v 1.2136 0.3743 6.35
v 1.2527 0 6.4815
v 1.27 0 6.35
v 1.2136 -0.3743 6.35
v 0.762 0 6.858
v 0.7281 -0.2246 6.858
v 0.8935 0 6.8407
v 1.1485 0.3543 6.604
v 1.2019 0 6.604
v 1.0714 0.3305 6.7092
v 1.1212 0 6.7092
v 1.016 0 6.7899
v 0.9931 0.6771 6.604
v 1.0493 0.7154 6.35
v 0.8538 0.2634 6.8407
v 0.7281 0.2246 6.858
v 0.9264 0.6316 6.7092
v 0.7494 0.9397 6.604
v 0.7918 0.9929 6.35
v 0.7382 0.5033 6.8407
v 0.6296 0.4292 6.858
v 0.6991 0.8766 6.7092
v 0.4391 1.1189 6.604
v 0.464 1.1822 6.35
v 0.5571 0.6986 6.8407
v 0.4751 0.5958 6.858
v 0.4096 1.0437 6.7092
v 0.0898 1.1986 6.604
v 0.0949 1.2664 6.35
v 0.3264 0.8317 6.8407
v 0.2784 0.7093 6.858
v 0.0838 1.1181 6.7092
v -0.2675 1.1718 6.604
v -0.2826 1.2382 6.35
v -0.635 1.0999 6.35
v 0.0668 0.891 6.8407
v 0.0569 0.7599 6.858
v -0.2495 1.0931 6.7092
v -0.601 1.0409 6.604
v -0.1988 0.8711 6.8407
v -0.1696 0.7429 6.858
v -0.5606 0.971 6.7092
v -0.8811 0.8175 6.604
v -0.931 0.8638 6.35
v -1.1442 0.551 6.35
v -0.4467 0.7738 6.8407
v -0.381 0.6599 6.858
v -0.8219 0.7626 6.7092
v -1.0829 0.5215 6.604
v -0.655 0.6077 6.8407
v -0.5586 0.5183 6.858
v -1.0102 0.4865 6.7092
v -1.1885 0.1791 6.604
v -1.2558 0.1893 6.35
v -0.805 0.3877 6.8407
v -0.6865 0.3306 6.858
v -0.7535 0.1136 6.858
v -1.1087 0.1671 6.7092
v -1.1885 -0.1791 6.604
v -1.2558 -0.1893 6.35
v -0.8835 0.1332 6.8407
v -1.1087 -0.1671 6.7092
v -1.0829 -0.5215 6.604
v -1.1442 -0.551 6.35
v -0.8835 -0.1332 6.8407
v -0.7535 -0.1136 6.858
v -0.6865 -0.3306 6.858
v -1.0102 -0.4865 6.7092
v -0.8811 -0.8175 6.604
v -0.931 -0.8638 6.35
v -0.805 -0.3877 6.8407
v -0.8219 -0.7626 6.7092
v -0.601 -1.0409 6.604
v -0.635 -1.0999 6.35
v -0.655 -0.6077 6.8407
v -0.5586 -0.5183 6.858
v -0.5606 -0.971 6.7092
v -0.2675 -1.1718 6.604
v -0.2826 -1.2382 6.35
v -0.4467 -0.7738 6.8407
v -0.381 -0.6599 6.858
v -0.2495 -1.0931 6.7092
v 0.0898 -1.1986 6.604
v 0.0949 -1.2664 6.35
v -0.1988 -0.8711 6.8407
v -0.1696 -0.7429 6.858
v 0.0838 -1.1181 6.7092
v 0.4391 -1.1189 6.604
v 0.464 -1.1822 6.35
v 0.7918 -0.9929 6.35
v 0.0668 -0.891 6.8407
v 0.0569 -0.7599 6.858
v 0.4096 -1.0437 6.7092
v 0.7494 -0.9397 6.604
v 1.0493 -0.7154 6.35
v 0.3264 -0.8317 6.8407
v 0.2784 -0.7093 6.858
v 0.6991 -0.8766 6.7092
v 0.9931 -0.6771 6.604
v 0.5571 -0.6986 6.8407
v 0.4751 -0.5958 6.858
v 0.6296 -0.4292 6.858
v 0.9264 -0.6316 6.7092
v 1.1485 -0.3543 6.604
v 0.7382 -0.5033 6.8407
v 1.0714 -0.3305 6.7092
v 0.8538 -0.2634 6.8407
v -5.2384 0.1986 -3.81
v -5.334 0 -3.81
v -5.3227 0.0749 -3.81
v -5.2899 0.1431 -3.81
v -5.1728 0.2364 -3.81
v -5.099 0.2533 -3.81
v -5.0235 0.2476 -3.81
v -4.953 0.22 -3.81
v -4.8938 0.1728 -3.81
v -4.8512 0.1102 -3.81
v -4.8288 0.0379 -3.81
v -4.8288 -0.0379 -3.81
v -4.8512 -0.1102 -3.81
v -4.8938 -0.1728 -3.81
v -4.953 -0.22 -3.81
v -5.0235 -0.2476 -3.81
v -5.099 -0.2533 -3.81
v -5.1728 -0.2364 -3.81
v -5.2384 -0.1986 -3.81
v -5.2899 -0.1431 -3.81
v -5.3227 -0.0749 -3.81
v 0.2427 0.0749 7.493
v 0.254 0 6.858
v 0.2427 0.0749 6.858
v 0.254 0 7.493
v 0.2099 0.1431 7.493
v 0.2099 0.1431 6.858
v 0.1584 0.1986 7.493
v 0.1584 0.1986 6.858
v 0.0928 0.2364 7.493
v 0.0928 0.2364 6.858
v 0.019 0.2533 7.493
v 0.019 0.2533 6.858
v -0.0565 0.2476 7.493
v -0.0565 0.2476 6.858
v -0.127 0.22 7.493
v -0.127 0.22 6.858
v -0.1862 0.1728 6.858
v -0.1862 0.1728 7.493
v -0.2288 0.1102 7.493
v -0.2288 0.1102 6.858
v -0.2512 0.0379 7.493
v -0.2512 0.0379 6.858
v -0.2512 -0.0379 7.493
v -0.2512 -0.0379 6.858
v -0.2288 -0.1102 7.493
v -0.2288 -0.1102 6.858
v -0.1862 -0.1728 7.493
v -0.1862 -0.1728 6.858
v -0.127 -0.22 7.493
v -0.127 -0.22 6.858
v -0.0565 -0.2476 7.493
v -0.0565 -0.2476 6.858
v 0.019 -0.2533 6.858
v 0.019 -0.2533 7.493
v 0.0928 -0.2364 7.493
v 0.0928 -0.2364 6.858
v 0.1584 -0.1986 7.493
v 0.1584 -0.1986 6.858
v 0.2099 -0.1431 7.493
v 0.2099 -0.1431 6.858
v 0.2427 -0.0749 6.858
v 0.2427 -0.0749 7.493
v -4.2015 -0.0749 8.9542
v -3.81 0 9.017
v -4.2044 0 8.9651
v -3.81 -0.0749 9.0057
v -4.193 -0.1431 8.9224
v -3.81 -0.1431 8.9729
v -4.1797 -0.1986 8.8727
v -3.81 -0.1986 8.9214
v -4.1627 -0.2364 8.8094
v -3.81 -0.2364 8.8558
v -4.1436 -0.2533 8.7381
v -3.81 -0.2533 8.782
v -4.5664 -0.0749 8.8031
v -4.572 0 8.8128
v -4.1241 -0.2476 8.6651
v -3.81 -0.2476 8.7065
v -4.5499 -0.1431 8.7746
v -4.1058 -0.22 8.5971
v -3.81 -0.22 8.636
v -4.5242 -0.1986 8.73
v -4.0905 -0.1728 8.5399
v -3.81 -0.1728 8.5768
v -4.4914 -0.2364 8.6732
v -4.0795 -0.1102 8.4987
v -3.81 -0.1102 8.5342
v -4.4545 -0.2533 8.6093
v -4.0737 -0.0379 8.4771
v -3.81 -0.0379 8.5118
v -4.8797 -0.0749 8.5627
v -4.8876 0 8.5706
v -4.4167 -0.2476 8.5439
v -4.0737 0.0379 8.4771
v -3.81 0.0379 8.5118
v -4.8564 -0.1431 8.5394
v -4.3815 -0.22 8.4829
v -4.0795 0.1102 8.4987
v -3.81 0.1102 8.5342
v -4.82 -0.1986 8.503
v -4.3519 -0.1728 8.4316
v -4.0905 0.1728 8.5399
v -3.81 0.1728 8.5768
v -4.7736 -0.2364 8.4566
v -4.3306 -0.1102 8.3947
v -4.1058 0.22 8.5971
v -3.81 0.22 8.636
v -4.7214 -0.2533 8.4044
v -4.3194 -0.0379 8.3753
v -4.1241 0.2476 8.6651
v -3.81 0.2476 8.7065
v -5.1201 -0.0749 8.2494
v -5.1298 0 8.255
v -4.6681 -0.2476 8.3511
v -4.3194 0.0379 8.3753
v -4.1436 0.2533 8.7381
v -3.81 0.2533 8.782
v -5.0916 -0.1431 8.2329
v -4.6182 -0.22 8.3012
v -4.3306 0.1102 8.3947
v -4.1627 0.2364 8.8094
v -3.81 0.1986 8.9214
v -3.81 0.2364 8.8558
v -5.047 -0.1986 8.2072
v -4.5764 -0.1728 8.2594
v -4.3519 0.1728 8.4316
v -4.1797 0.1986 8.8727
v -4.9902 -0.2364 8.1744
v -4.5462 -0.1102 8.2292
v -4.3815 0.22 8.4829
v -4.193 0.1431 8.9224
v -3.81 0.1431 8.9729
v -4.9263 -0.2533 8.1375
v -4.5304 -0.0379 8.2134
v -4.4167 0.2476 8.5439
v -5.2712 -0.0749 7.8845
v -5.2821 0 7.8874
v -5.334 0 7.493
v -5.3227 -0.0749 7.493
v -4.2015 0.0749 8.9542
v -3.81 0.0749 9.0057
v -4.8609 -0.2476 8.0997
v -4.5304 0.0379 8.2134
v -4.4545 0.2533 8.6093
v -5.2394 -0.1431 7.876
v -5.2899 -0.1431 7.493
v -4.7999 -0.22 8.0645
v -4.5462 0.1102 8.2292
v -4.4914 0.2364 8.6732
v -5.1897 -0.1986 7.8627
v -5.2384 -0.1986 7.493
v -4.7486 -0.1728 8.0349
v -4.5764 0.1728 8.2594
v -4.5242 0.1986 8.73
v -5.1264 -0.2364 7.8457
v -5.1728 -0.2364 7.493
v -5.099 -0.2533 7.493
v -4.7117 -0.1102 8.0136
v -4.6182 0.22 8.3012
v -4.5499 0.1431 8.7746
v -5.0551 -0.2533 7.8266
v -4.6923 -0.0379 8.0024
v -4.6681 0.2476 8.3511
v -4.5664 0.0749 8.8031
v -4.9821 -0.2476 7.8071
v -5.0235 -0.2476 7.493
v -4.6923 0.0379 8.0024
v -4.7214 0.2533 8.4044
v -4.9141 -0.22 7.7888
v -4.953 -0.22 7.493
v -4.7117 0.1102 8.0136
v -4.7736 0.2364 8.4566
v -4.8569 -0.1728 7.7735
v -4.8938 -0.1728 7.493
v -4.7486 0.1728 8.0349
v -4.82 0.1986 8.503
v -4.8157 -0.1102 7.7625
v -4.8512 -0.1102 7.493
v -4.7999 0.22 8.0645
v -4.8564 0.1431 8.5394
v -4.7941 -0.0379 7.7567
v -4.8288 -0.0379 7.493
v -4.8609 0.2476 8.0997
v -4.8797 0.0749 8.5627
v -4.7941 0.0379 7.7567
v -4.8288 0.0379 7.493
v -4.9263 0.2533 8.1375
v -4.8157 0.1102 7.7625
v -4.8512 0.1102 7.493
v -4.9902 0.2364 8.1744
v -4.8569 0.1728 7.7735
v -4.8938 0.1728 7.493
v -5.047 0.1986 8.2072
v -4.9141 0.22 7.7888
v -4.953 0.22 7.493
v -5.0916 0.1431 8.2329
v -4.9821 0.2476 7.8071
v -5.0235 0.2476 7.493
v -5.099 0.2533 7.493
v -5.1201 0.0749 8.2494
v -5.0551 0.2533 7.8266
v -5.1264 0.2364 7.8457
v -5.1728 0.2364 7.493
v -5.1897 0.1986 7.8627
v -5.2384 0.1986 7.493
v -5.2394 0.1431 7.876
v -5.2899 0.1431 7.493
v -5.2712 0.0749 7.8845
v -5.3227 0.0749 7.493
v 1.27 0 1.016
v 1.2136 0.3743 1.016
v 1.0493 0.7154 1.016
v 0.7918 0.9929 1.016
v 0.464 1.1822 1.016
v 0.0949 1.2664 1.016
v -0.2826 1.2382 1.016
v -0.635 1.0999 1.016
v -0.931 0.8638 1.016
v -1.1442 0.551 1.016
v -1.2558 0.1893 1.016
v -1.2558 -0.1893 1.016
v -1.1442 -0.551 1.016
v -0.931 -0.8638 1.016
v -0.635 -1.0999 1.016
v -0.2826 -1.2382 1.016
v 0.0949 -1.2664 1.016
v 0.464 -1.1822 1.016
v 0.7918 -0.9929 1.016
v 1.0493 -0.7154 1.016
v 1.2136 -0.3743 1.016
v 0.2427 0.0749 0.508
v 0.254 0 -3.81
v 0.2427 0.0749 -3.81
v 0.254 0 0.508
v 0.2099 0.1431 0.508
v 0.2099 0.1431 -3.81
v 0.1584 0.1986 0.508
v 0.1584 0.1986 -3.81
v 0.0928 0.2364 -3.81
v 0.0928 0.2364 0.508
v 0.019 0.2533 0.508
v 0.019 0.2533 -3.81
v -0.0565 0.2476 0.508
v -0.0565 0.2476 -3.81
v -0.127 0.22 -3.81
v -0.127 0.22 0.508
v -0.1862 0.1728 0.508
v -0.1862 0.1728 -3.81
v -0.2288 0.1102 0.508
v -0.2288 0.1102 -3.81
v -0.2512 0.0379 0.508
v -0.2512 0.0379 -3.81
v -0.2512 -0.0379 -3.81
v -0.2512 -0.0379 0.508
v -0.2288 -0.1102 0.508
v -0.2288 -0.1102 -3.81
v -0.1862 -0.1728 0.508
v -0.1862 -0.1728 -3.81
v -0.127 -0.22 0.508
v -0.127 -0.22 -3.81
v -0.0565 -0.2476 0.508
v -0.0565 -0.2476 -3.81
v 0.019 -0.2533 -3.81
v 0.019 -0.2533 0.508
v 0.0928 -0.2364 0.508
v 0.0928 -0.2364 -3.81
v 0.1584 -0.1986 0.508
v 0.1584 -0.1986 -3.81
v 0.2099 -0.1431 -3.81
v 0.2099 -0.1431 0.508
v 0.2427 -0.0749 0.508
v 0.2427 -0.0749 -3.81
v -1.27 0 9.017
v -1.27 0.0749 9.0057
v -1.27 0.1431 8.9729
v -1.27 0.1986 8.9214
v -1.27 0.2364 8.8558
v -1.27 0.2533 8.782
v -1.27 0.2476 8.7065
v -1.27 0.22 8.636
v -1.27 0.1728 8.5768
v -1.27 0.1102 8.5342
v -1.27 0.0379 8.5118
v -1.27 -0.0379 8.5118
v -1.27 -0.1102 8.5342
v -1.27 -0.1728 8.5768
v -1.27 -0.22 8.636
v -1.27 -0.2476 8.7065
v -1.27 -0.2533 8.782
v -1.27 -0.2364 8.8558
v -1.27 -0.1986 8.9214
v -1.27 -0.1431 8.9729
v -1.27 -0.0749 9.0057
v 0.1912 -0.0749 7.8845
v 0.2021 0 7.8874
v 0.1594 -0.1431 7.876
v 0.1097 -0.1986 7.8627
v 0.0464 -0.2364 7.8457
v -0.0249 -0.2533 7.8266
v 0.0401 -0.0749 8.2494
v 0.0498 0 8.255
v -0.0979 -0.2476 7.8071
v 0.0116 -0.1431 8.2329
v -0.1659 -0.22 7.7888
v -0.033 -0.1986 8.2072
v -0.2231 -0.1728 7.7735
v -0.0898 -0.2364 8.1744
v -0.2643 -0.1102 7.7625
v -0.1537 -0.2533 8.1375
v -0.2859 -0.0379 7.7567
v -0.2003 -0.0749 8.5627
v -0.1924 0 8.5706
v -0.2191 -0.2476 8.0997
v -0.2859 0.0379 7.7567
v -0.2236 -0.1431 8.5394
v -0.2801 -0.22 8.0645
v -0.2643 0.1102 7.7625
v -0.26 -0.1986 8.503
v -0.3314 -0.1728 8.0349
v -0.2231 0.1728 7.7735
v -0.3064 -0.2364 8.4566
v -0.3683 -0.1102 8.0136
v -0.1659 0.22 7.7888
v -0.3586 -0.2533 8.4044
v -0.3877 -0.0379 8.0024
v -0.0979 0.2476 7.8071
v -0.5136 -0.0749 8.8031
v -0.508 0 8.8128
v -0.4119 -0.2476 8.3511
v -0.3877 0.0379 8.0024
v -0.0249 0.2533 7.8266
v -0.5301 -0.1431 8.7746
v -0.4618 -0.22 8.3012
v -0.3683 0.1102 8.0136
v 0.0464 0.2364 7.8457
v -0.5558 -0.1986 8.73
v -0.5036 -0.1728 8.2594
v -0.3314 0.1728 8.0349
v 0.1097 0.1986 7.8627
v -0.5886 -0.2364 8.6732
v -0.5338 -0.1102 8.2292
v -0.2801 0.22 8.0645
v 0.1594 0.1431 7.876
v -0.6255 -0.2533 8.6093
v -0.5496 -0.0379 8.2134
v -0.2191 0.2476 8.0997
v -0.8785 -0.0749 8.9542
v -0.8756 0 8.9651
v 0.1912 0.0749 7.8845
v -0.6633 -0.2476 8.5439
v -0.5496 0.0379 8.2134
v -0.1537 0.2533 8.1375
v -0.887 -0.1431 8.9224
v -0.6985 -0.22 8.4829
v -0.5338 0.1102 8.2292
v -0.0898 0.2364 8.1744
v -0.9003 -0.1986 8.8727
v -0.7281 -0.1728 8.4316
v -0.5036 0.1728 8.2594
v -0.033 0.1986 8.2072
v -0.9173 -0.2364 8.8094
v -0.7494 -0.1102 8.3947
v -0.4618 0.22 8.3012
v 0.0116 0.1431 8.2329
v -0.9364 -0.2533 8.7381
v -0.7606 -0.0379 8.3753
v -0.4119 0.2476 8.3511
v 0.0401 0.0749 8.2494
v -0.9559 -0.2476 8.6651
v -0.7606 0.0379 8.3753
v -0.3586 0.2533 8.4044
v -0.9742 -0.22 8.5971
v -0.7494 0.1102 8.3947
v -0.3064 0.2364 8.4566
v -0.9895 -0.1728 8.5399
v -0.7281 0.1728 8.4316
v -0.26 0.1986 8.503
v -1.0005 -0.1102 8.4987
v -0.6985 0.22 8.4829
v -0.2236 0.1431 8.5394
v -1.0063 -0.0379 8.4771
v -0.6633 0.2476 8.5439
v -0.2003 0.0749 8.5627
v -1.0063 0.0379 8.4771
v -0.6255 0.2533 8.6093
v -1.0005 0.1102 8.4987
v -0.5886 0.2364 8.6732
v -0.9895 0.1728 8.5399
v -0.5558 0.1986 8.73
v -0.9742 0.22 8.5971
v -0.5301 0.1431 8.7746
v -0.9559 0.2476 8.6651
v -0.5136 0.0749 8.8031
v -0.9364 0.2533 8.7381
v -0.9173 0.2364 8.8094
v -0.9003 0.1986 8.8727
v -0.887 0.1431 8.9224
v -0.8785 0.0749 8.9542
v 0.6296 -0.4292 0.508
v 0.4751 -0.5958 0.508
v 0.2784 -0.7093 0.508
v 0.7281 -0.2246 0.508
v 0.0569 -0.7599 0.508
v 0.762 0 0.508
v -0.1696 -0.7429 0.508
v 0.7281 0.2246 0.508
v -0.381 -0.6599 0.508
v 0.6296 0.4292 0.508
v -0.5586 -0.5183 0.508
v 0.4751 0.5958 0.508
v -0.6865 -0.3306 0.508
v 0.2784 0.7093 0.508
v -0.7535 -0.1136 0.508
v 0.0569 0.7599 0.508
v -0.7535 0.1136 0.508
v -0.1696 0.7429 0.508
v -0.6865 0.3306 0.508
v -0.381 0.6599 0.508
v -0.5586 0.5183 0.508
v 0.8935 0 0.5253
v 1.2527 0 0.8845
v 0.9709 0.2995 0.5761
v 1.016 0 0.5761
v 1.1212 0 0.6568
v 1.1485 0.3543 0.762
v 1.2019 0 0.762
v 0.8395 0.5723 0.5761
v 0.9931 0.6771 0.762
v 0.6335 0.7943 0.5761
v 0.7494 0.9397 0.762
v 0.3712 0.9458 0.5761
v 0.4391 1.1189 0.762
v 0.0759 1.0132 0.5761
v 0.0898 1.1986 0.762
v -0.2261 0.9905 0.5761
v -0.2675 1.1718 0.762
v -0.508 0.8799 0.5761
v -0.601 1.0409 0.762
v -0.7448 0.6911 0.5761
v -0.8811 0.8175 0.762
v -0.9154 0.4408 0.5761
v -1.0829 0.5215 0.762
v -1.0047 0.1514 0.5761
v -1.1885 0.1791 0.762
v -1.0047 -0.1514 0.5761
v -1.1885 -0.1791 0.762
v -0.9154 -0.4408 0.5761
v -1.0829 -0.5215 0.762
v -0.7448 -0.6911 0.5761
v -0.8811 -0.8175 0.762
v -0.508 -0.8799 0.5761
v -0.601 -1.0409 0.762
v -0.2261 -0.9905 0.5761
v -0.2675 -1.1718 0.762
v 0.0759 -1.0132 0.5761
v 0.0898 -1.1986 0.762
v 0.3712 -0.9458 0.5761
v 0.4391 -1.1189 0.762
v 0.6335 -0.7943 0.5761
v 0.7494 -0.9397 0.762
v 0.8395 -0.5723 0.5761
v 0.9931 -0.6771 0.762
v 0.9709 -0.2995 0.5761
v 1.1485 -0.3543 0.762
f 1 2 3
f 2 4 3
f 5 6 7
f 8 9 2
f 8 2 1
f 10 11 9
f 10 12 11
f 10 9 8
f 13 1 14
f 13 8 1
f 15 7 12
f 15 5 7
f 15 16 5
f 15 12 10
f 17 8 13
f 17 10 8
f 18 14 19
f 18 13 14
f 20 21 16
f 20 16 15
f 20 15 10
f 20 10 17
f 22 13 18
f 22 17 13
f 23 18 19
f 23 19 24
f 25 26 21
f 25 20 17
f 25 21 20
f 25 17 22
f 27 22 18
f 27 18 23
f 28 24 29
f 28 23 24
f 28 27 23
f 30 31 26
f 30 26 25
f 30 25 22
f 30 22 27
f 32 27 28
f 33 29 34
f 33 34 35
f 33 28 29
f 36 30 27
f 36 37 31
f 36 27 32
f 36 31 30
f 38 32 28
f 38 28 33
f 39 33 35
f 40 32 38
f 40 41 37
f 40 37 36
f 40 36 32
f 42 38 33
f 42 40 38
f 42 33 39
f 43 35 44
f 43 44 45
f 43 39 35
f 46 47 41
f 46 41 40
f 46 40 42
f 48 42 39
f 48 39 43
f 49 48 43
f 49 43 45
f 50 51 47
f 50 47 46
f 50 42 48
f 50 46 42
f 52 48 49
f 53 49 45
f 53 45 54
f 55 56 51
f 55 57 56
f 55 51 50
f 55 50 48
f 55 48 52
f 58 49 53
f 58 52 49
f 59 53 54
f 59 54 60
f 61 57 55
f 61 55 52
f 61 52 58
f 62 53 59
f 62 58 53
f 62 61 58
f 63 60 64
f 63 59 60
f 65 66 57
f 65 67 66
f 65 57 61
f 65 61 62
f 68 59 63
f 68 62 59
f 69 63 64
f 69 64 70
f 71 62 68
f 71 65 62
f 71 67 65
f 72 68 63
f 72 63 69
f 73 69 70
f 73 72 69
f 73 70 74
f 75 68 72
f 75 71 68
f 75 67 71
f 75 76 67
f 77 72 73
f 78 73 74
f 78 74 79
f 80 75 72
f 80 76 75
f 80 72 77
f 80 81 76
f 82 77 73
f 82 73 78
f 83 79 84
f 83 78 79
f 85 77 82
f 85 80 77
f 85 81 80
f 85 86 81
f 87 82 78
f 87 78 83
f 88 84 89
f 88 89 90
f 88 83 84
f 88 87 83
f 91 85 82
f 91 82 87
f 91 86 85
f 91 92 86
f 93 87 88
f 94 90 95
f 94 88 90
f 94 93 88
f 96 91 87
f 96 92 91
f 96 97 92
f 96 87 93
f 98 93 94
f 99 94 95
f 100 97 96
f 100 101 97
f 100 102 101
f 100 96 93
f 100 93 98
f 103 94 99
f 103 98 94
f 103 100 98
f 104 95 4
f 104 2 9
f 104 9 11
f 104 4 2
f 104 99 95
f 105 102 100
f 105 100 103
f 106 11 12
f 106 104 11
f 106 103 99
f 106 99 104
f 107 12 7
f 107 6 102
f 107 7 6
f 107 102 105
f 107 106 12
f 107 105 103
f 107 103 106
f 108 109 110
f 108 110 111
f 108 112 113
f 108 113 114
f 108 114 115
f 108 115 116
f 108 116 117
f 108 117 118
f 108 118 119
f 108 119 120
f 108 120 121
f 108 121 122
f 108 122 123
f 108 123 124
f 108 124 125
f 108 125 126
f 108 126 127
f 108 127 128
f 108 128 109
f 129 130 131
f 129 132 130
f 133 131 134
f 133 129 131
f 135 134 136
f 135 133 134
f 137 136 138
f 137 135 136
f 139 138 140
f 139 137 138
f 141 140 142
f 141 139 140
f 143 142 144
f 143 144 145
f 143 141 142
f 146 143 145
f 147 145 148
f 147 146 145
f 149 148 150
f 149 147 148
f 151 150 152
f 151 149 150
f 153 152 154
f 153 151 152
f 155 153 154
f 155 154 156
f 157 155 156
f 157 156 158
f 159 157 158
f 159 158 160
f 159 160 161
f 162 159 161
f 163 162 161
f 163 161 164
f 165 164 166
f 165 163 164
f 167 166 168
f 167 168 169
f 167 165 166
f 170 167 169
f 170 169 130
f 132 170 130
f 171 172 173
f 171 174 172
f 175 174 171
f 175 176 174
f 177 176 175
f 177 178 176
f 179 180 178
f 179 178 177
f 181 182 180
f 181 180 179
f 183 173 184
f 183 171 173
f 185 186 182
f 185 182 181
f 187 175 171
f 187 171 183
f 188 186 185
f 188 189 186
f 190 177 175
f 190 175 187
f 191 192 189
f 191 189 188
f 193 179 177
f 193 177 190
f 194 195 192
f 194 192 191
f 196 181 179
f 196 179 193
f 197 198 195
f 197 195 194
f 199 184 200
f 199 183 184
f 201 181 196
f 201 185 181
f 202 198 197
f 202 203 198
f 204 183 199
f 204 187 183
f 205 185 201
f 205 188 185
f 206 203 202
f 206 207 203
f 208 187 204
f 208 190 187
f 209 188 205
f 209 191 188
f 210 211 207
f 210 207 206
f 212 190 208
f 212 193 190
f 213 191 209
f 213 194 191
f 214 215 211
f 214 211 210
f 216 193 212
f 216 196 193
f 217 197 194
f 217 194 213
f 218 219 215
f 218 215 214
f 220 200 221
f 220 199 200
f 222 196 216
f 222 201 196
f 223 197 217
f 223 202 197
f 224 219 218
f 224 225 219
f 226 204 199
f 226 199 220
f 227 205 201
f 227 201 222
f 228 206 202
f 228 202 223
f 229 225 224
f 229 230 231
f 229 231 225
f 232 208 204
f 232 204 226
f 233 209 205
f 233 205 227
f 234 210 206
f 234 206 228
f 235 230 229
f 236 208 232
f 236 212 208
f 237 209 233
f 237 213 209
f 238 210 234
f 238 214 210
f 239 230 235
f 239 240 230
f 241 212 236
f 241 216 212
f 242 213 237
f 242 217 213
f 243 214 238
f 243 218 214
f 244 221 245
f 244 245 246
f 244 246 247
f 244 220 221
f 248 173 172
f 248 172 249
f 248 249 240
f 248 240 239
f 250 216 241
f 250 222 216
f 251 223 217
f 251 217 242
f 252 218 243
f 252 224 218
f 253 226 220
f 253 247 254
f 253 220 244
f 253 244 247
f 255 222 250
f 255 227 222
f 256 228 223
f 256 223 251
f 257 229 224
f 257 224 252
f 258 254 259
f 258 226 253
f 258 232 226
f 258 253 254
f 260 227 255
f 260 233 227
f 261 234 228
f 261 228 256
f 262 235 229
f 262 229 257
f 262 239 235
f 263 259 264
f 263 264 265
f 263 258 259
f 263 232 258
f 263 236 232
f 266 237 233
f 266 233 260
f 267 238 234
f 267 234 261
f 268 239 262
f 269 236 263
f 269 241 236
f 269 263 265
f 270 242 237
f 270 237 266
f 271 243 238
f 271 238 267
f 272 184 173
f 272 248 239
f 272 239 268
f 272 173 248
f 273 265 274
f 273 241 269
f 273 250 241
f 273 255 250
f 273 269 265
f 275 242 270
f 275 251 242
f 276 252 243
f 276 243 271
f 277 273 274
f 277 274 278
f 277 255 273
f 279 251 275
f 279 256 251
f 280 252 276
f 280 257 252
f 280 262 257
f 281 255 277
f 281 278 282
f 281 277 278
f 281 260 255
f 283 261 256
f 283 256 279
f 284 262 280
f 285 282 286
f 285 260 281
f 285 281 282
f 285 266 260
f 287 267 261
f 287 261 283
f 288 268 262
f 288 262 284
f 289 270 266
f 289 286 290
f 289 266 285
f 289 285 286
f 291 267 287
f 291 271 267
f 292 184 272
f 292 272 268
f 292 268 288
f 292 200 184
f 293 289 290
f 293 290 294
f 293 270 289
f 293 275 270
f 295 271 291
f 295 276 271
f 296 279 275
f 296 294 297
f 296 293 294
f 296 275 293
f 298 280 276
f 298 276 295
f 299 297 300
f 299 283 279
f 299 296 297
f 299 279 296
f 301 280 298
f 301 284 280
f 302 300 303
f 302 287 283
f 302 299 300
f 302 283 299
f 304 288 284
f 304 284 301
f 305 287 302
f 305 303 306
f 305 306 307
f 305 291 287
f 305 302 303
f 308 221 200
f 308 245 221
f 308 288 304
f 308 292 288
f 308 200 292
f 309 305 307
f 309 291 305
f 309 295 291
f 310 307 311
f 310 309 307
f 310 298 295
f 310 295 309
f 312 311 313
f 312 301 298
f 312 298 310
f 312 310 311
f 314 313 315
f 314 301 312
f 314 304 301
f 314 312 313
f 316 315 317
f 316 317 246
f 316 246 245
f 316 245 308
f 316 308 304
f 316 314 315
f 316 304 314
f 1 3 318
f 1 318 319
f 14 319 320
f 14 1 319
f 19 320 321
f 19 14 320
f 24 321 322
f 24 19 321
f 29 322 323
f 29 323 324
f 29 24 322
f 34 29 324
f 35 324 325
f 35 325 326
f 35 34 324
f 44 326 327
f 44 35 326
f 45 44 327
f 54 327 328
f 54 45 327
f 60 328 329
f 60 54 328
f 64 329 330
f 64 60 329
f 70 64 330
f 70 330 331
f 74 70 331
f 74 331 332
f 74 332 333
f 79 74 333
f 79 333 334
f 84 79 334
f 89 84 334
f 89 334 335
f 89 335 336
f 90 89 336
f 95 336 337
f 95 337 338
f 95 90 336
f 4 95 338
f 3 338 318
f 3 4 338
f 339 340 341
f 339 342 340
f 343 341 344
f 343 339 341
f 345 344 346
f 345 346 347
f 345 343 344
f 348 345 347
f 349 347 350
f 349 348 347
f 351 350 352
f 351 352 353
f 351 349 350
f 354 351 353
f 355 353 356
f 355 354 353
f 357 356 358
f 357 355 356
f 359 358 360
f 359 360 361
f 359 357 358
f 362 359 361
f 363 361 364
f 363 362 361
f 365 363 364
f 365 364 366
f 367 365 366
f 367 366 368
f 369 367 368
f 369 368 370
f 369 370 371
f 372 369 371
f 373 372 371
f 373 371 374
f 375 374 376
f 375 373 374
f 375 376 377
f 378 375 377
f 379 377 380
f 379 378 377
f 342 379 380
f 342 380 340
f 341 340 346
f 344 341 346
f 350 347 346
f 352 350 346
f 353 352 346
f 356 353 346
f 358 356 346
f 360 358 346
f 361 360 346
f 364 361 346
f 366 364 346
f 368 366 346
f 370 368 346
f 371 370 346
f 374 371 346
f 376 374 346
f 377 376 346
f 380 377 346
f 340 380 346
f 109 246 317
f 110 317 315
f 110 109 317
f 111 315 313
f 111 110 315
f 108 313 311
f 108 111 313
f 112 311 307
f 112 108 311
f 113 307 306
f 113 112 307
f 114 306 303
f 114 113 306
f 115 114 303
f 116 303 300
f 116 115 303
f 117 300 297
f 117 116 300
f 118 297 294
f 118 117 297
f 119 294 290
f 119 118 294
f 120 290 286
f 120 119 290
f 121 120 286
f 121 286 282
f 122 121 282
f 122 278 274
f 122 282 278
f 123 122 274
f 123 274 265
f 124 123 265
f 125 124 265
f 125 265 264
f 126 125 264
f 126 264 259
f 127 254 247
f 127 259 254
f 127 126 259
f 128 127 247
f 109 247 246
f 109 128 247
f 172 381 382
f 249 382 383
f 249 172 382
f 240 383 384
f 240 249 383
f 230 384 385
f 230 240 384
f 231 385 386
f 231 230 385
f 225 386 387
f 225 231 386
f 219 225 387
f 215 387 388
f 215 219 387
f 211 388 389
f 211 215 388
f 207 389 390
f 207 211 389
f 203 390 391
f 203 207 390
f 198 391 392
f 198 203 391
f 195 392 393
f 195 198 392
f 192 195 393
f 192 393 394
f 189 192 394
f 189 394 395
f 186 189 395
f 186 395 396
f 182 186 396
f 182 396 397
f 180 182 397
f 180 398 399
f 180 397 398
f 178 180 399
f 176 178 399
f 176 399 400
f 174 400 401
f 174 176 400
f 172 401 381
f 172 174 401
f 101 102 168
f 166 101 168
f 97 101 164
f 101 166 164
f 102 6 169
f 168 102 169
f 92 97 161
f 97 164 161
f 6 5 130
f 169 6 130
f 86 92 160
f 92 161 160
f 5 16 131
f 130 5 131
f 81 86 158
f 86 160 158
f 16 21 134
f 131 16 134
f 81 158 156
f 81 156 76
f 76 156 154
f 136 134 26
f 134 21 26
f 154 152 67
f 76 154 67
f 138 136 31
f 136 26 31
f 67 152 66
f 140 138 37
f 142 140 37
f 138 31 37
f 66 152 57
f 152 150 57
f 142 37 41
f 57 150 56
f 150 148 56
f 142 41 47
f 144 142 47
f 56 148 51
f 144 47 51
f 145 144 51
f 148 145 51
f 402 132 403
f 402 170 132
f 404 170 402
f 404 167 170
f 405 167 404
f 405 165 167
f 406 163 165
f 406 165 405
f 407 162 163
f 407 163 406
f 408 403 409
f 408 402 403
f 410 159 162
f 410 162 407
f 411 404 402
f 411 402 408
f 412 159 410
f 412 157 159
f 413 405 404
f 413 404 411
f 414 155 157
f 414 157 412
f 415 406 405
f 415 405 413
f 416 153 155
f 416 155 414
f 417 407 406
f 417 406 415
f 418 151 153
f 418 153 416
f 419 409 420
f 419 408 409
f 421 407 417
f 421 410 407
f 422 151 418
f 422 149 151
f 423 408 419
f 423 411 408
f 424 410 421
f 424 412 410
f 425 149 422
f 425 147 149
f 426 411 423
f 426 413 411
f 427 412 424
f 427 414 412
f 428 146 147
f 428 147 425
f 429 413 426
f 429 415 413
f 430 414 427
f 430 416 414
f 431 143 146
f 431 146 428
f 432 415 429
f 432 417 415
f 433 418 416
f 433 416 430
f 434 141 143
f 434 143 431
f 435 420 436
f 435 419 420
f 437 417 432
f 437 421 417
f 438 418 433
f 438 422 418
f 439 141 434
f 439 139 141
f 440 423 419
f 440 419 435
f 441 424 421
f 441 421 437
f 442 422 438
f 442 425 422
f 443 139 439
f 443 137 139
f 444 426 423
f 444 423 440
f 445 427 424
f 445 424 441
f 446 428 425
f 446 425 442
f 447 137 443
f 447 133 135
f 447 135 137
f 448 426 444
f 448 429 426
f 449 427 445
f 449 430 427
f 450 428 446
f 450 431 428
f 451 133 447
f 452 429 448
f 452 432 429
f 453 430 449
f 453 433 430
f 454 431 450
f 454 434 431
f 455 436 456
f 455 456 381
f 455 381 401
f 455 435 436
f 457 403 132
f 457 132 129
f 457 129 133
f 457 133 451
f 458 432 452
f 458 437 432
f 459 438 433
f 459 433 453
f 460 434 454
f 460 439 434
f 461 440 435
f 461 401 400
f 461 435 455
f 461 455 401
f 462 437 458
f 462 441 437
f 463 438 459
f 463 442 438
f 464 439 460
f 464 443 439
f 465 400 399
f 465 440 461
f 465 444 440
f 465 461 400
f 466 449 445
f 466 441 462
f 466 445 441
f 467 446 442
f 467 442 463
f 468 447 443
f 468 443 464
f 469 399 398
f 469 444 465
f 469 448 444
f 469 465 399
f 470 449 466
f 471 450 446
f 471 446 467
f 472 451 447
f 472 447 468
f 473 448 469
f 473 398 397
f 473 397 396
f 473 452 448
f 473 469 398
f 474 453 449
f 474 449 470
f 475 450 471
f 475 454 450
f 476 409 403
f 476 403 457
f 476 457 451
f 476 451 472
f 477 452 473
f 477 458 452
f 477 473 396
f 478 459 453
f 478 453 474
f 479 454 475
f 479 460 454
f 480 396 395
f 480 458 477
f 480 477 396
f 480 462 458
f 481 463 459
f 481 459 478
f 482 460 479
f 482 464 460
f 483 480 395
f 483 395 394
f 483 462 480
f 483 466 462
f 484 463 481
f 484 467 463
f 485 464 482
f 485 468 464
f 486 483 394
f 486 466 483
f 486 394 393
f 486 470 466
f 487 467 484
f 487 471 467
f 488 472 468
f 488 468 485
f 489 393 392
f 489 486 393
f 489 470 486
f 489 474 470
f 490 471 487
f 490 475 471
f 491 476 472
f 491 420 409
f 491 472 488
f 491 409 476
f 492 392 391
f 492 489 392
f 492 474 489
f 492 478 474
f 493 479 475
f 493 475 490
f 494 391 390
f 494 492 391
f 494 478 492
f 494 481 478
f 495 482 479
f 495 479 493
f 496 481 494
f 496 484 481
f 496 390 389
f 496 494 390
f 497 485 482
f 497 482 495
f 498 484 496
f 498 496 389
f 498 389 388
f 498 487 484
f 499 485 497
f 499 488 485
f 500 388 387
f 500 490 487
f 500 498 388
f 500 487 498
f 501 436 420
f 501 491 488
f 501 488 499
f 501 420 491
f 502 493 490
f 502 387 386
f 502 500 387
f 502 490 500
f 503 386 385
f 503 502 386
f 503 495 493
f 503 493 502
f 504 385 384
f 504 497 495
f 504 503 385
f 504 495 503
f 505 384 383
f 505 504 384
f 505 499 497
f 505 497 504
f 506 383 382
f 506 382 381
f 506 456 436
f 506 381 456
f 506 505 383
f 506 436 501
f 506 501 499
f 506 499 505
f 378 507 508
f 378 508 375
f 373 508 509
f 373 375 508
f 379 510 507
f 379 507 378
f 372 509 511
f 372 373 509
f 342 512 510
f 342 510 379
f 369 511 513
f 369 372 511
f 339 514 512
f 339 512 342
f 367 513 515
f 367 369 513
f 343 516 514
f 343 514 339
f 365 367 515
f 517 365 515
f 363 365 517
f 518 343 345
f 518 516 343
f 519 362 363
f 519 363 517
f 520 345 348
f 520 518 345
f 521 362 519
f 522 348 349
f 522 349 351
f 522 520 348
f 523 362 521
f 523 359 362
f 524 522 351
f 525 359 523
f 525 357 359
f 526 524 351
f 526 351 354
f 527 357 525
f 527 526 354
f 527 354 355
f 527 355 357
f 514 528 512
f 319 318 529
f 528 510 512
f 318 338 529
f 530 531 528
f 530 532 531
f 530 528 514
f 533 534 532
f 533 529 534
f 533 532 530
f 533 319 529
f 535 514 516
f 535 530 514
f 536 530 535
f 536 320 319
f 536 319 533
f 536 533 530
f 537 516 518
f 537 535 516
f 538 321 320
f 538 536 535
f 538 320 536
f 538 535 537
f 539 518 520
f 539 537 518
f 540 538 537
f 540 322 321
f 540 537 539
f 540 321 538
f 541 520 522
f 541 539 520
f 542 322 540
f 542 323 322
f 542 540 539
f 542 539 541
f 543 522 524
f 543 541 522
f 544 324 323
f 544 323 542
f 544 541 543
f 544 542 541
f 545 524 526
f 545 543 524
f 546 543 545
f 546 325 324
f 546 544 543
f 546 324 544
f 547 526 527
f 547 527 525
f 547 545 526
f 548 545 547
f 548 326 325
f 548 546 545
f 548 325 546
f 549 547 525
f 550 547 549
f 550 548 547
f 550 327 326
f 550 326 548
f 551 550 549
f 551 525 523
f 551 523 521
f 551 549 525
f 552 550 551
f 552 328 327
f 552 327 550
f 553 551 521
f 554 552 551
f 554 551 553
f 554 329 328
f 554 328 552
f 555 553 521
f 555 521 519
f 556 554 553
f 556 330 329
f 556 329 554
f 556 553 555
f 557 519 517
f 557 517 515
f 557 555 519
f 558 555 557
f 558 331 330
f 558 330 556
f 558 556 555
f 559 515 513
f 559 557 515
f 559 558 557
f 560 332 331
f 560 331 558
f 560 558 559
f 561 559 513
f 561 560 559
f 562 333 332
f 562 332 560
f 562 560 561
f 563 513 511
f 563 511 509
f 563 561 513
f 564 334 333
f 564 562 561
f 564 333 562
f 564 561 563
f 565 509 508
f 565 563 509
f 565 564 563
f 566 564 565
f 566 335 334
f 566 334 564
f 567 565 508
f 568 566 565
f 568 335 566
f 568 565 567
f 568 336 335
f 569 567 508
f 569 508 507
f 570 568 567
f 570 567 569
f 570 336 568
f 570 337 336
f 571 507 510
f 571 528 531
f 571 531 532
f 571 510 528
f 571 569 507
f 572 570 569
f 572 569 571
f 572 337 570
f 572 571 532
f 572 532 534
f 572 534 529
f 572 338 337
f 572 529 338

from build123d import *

# Parameters (mm, degrees)
F0_W = 1.27
F0_H = 6.35
F2_R = 0.508
F5_R = 0.254


with BuildPart() as f1:
    # F0 (on Front) → F1 (revolve)
    with BuildSketch(Plane.XZ):
        with Locations((0.635, 3.683)):
            Rectangle(F0_W, F0_H)
    revolve(axis=Axis((0, 0, 3.683), (0, 0, 1)))

    # F2
    f2_edges = [f1.edges().sort_by_distance(p)[0] for p in [
        (-1.27, 0, 6.858),
        (-1.27, 0, 0.508),
    ]]
    fillet(f2_edges, radius=F2_R)

    # F6: sweep along a path in F3
    with BuildLine(Plane.XZ) as f6_path:
        Line((0, -3.81), (0, 7.493))
        ThreePointArc((0, 7.493), (-0.3719743879, 8.3910256121), (-1.27, 8.763))
        Line((-1.27, 8.763), (-3.81, 8.763))
        ThreePointArc((-3.81, 8.763), (-4.7080256121, 8.3910256121), (-5.08, 7.493))
        Line((-5.08, 7.493), (-5.08, -3.81))
    # F5 (on offset) → F6 (sweep)
    with BuildSketch(Plane.XY.offset(-3.81)):
        Circle(F5_R)
    sweep(path=f6_path.line)


solid = f1.part
